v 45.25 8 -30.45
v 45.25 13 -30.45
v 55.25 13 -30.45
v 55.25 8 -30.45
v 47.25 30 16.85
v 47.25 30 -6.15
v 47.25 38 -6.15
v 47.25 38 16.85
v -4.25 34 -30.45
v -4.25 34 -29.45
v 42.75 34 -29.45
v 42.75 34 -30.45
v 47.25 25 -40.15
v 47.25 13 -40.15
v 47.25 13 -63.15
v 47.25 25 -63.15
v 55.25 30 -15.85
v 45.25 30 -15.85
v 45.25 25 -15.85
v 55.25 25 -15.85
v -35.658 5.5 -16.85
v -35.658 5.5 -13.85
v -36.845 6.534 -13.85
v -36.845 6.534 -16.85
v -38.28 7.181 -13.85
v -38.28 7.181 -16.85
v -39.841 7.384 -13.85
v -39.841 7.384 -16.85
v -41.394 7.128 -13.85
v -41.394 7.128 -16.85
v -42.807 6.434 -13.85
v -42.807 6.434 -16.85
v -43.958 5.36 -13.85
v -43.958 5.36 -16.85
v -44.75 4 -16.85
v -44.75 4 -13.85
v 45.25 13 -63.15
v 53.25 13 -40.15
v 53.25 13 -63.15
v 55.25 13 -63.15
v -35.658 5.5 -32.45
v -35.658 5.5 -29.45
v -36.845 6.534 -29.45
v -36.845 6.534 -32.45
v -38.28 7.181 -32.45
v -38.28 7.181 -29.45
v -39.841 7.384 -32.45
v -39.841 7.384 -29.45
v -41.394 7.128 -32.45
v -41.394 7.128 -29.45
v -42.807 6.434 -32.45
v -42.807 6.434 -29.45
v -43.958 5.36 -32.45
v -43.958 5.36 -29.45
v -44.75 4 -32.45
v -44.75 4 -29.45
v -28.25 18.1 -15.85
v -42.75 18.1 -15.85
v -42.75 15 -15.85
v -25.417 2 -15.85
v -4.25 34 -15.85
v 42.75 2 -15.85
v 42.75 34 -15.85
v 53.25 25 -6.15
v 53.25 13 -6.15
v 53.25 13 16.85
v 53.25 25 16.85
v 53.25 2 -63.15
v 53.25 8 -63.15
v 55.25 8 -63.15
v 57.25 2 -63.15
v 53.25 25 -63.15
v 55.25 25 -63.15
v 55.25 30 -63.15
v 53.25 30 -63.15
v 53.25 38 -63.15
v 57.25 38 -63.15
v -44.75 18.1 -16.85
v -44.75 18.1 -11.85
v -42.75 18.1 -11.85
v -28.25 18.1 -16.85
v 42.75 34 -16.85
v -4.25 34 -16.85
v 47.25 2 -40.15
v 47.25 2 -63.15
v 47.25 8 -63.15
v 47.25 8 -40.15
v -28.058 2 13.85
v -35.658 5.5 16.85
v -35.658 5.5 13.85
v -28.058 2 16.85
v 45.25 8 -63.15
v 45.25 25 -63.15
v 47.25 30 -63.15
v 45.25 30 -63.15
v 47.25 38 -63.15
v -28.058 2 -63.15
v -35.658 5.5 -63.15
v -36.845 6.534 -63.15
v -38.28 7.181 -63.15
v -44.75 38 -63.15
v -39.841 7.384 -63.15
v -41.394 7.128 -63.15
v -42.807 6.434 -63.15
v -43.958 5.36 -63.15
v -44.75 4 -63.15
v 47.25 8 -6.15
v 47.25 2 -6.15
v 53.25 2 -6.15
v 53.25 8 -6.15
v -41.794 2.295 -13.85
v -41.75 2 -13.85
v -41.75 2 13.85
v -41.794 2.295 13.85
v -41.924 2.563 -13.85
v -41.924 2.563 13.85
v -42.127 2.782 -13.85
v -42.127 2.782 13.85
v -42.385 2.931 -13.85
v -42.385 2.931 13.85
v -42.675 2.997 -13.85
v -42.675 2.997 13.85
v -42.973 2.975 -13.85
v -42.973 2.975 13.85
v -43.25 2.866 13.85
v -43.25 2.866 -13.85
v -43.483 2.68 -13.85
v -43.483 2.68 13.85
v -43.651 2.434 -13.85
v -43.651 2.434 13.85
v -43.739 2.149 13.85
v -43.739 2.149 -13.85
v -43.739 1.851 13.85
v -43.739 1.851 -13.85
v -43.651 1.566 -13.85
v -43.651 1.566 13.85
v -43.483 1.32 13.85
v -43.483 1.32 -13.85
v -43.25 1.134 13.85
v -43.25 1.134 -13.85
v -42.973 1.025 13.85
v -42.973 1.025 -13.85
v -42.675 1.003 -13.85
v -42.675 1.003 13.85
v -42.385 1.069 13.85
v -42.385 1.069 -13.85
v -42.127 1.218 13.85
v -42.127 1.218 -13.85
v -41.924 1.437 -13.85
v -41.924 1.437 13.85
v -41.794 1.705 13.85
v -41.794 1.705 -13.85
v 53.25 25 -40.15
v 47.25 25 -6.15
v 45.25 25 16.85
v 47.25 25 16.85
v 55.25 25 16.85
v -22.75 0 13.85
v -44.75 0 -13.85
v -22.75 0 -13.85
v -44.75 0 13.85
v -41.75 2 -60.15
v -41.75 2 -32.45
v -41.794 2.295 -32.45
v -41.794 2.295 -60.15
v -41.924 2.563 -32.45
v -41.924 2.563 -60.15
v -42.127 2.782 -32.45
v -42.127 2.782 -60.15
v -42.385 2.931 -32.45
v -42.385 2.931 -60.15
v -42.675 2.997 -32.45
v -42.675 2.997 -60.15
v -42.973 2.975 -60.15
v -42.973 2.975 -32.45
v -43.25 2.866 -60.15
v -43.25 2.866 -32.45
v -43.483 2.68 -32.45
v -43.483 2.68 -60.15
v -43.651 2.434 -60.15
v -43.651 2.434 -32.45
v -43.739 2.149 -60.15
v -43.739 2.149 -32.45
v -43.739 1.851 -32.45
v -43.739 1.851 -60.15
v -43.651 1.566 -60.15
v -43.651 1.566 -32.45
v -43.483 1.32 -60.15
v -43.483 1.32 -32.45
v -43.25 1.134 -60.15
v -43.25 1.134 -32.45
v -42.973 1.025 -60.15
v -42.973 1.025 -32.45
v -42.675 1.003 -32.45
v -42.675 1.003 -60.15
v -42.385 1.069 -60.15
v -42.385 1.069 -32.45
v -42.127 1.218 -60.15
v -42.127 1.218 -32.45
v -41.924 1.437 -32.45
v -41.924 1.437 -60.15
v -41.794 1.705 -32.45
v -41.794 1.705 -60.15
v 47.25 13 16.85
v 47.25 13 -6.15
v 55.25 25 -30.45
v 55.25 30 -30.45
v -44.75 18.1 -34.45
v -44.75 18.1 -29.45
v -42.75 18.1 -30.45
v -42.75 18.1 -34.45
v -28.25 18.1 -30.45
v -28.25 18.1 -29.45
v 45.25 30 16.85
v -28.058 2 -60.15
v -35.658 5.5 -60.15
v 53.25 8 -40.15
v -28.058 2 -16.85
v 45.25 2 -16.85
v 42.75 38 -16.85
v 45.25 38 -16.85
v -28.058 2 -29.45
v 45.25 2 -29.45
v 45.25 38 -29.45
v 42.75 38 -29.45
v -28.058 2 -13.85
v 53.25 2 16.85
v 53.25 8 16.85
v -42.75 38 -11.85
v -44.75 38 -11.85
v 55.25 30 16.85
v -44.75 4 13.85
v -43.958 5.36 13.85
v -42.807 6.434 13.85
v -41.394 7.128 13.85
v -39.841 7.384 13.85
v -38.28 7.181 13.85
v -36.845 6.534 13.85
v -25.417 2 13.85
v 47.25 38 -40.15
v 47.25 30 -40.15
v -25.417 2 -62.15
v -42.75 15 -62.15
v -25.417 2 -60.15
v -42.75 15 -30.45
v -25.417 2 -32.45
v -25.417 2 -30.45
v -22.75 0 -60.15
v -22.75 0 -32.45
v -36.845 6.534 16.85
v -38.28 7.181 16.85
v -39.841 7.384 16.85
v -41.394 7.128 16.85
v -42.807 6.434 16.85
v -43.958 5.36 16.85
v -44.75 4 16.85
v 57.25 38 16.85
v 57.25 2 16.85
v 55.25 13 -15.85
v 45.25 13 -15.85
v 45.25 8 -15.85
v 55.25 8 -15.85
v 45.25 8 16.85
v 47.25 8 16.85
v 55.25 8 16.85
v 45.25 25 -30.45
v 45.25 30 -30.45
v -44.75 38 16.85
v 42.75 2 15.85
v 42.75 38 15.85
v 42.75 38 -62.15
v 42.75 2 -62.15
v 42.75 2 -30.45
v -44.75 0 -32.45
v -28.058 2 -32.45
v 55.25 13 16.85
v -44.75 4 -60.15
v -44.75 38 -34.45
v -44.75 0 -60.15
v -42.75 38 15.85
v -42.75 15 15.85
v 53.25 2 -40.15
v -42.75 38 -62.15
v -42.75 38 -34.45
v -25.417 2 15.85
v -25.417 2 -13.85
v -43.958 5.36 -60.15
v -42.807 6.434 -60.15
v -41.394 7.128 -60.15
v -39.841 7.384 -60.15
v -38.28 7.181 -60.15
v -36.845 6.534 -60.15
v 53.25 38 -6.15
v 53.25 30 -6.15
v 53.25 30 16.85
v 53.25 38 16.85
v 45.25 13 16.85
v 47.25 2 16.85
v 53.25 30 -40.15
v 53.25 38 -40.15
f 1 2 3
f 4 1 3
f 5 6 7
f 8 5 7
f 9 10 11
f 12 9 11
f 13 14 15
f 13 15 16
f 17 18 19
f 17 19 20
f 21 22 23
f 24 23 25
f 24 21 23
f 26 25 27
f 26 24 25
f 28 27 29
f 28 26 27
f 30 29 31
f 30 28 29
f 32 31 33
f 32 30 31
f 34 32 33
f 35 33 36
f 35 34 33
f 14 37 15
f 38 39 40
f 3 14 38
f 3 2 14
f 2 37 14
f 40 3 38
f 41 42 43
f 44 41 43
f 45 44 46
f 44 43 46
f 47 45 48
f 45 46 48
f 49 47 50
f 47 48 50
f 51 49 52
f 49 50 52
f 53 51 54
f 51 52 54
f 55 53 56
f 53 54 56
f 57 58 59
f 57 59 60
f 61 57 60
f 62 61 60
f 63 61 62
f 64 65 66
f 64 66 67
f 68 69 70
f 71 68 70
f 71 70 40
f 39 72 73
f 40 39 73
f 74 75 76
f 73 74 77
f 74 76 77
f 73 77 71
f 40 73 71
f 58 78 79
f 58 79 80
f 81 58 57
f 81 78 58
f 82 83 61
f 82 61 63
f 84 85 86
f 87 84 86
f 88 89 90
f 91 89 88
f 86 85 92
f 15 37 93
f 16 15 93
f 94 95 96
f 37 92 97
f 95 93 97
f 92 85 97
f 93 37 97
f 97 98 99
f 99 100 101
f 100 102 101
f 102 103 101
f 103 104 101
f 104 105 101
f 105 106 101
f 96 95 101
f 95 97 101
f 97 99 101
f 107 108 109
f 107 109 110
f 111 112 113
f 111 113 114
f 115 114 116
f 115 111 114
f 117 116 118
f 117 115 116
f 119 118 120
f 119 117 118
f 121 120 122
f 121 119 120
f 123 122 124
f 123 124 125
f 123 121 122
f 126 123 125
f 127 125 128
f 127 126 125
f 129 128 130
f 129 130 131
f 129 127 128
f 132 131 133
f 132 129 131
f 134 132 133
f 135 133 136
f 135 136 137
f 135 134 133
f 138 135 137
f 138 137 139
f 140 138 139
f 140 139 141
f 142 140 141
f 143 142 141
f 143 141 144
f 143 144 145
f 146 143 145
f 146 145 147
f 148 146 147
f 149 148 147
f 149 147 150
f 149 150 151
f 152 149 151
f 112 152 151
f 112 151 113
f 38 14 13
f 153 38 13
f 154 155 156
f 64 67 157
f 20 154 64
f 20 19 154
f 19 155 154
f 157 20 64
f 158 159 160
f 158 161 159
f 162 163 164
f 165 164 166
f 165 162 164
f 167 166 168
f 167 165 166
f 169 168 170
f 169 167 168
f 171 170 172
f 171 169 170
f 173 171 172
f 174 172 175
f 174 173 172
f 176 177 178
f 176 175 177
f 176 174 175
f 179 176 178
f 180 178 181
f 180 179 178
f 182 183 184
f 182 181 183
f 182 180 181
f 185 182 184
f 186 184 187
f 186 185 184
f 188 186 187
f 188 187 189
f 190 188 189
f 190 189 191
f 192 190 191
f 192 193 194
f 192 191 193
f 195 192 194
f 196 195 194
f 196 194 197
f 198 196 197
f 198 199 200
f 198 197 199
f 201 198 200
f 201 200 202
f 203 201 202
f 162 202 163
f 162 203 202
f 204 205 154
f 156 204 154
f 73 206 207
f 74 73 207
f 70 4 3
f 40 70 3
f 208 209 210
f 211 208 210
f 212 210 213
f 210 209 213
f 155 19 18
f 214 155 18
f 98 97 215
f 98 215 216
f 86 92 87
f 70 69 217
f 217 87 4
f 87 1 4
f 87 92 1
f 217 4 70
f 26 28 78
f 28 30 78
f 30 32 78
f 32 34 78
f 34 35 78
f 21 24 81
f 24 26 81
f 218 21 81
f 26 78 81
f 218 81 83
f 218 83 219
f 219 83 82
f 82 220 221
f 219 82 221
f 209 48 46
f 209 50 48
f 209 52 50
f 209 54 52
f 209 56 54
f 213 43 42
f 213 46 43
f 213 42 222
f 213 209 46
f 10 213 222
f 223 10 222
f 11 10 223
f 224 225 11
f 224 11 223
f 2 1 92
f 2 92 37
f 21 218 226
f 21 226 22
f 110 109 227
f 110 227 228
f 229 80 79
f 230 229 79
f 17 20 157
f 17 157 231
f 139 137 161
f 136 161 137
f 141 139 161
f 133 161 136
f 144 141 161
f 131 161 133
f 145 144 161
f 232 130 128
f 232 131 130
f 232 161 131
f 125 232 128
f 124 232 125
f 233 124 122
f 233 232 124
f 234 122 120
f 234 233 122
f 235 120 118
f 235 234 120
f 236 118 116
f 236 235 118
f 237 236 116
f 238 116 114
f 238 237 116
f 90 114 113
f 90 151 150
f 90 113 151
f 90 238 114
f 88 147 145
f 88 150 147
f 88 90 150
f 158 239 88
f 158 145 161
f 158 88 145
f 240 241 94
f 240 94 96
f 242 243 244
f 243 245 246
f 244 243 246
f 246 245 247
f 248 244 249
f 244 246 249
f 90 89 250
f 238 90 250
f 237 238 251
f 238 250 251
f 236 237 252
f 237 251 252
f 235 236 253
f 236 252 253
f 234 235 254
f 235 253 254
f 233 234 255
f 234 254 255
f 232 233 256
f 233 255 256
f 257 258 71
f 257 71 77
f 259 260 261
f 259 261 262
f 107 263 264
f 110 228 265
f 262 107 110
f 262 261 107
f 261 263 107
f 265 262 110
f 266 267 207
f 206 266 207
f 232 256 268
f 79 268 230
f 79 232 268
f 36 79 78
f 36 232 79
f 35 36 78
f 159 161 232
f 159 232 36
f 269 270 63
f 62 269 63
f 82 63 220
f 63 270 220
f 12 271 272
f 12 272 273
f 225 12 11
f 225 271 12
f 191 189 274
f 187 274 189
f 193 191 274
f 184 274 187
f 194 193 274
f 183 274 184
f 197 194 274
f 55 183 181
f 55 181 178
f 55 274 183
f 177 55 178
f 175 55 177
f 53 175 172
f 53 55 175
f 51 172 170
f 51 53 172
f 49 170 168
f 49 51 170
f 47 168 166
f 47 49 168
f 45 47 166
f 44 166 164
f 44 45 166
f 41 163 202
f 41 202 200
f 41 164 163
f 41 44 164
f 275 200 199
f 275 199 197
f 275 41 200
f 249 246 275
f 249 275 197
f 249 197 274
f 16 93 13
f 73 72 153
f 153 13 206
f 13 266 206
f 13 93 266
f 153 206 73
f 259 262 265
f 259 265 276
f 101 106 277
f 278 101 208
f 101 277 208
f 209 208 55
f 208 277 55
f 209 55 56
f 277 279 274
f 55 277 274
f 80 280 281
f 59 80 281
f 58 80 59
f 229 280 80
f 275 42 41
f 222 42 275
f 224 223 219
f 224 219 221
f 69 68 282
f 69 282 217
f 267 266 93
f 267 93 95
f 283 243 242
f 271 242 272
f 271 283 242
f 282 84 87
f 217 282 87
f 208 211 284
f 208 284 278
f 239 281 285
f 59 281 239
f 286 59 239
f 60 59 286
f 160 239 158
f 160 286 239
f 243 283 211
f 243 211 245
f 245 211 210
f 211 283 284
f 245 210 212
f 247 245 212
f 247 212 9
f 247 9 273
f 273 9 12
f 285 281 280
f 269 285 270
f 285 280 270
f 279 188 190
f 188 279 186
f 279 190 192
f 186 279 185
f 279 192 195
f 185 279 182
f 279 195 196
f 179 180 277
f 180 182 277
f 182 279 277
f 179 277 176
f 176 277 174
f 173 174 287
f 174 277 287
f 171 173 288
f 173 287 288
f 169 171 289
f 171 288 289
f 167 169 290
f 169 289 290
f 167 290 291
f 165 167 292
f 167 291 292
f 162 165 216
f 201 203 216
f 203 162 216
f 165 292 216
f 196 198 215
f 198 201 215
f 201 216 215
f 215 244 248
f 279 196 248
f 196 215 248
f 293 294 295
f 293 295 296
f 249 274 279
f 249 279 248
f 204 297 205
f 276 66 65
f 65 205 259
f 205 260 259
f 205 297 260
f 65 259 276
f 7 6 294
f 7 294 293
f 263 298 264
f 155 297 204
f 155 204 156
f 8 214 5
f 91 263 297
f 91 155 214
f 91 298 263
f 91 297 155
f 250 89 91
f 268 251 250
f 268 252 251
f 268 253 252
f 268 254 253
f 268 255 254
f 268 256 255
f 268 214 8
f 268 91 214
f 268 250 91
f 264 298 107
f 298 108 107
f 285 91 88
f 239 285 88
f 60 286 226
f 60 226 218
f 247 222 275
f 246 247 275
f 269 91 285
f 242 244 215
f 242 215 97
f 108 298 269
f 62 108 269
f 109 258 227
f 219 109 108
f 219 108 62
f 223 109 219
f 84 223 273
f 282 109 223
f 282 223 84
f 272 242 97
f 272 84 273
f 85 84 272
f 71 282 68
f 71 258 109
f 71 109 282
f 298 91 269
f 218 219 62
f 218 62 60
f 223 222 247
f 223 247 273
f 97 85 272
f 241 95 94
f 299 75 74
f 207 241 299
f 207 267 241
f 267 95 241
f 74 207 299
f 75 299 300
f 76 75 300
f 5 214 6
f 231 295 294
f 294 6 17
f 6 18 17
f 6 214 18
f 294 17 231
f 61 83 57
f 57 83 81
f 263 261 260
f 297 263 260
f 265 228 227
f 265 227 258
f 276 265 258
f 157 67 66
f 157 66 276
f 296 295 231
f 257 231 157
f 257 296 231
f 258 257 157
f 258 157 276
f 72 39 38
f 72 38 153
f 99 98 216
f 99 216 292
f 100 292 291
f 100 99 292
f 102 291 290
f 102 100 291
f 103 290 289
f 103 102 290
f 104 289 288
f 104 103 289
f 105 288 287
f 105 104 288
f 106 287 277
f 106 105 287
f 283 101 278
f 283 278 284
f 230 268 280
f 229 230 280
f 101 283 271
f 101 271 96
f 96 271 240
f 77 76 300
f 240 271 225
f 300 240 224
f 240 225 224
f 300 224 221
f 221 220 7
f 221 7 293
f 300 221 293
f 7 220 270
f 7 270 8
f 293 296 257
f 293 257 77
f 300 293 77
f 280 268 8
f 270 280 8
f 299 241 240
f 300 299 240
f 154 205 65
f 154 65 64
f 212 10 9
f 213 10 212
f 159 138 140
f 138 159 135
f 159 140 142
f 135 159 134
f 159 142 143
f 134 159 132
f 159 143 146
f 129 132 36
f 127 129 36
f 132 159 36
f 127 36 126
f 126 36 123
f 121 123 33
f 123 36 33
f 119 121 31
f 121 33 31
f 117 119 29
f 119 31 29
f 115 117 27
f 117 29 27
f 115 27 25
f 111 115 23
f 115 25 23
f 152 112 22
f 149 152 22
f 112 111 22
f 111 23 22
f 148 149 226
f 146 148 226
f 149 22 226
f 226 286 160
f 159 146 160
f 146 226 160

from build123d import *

# Parameters (mm, degrees)
SKETCH2_W            = 89.5
SKETCH2_H            = 33.7
BOSS_EXTRUDE1_DEPTH  = 38
SKETCH3_W            = 85.5
SKETCH3_H            = 31.7
CUT_EXTRUDE1_DEPTH   = 38
BOSS_EXTRUDE2_DEPTH  = 31.7
SKETCH5_W            = 33.7
SKETCH5_H            = 38
BOSS_EXTRUDE3_DEPTH  = 2.5
SKETCH6_W            = 2
SKETCH6_H            = 38
BOSS_EXTRUDE4_DEPTH  = 6.3
SKETCH7_W            = 34
SKETCH7_H            = 38
BOSS_EXTRUDE5_DEPTH  = 10
SKETCH8_W            = 4
SKETCH8_H            = 38
BOSS_EXTRUDE6_DEPTH  = 23
CUT_EXTRUDE2_START   = -32.7
SKETCH9_W            = 10
SKETCH9_H            = 5
CUT_EXTRUDE2_DEPTH   = 32.7
SKETCH11_W           = 80
SKETCH11_H           = 2
CUT_EXTRUDE3_DEPTH   = 80
CUT_EXTRUDE4_DEPTH   = 3
MIRROR4_COPY_1_DEPTH = 3
CUT_EXTRUDE5_START   = -74
SKETCH13_R           = 1
CUT_EXTRUDE5_DEPTH   = 74
SKETCH15_W           = 47
SKETCH15_H           = 1
CUT_EXTRUDE6_DEPTH   = 4
SKETCH16_W           = 40.5
SKETCH16_H           = 2
CUT_EXTRUDE7_DEPTH   = 19.9
SKETCH17_W           = 2
SKETCH17_H           = 19.9
CUT_EXTRUDE8_DEPTH   = 3
BOSS_EXTRUDE7_START  = -1
BOSS_EXTRUDE7_DEPTH  = 1


with BuildPart() as part:
    # Sketch2 → Boss-Extrude1 (new body)
    with BuildSketch(Plane(origin=(0, 0, 0), x_dir=(1, 0, 0), z_dir=(0, 1, 0))):
        Rectangle(SKETCH2_W, SKETCH2_H)
    extrude(amount=BOSS_EXTRUDE1_DEPTH)

    # Sketch3 → Cut-Extrude1 (cut)
    with BuildSketch(Plane(origin=(0, 38, 0), x_dir=(1, 0, 0), z_dir=(0, 1, 0))):
        Rectangle(SKETCH3_W, SKETCH3_H)
    extrude(amount=-CUT_EXTRUDE1_DEPTH, mode=Mode.SUBTRACT)

    # Sketch4 → Boss-Extrude2 (add)
    with BuildSketch(Plane.XY.offset(-15.85)):
        Polygon((-42.75, 0), (-42.75, 15), (-22.75, 0), align=None)
    extrude(amount=BOSS_EXTRUDE2_DEPTH)

    # Sketch5 → Boss-Extrude3 (add)
    with BuildSketch(Plane(origin=(44.75, 0, 0), x_dir=(0, 0, -1), z_dir=(1, 0, 0))):
        with Locations((0, 19)):
            Rectangle(SKETCH5_W, SKETCH5_H)
    extrude(amount=BOSS_EXTRUDE3_DEPTH)

    # Sketch6 → Boss-Extrude4 (add)
    with BuildSketch(Plane(origin=(0, 0, -16.85), x_dir=(-1, 0, 0), z_dir=(0, 0, -1))):
        with Locations((-46.25, 19)):
            Rectangle(SKETCH6_W, SKETCH6_H)
    extrude(amount=BOSS_EXTRUDE4_DEPTH)

    # Mirror1: part across plane


with BuildPart() as part_1:
    add(part.part)
    add(part.part.mirror(Plane(origin=(0, 0, -23.15), x_dir=(1, 0, 0), z_dir=(0, 0, -1))))

    # Sketch7 → Boss-Extrude5 (add)
    with BuildSketch(Plane(origin=(47.25, 0, 0), x_dir=(0, 0, -1), z_dir=(1, 0, 0))):
        with Locations((23.15, 19)):
            Rectangle(SKETCH7_W, SKETCH7_H)
    extrude(amount=BOSS_EXTRUDE5_DEPTH)

    # Sketch8 → Boss-Extrude6 (add)
    with BuildSketch(Plane.XY.offset(-6.15)):
        with Locations((55.25, 19)):
            Rectangle(SKETCH8_W, SKETCH8_H)
    boss_extrude6 = extrude(amount=BOSS_EXTRUDE6_DEPTH)

    # Sketch9 → Cut-Extrude2 (cut)
    with BuildSketch(Plane.XY.offset(16.85).offset(CUT_EXTRUDE2_START)):
        with Locations((50.25, 27.5)):
            Rectangle(SKETCH9_W, SKETCH9_H)
        with Locations((50.25, 10.5)):
            Rectangle(SKETCH9_W, SKETCH9_H)
    cut_extrude2 = extrude(amount=CUT_EXTRUDE2_DEPTH, mode=Mode.SUBTRACT)

    # Mirror2: Boss-Extrude6, Cut-Extrude2 across plane
    add(boss_extrude6.mirror(Plane(origin=(0, 0, -23.15), x_dir=(1, 0, 0), z_dir=(0, 0, -1))))
    add(cut_extrude2.mirror(Plane(origin=(0, 0, -23.15), x_dir=(1, 0, 0), z_dir=(0, 0, -1))), mode=Mode.SUBTRACT)

    # Sketch11 → Cut-Extrude3 (cut)
    with BuildSketch(Plane(origin=(57.25, 0, 0), x_dir=(0, 0, -1), z_dir=(1, 0, 0))):
        with Locations((23.15, 1)):
            Rectangle(SKETCH11_W, SKETCH11_H)
    extrude(amount=-CUT_EXTRUDE3_DEPTH, mode=Mode.SUBTRACT)

    # Sketch12 → Cut-Extrude4 (cut)
    with BuildSketch(Plane.XY.offset(16.85)):
        with BuildLine():
            Line((-22.75, 2), (-34.364835193, 2))
            ThreePointArc((-34.364835193, 2), (-40.768375168, 7.287996976), (-44.75, 0))
            Line((-44.75, 0), (-22.75, 0))
            Line((-22.75, 0), (-22.75, 2))
        make_face()
    cut_extrude4 = extrude(amount=-CUT_EXTRUDE4_DEPTH, mode=Mode.SUBTRACT)

    # Mirror3: Cut-Extrude4 across plane
    add(cut_extrude4.mirror(Plane.XY), mode=Mode.SUBTRACT)

    # Mirror4: Cut-Extrude4 across plane
    add(cut_extrude4.mirror(Plane(origin=(0, 0, -23.15), x_dir=(1, 0, 0), z_dir=(0, 0, -1))), mode=Mode.SUBTRACT)

    # Mirror4 copy 1 sketch → Mirror4 copy 1 (cut)
    with BuildSketch(Plane.XY.offset(-29.45)):
        with BuildLine():
            Line((-22.75, 2), (-34.364835193, 2))
            ThreePointArc((-34.364835193, 2), (-40.768375168, 7.287996976), (-44.75, 0))
            Line((-44.75, 0), (-22.75, 0))
            Line((-22.75, 0), (-22.75, 2))
        make_face()
    extrude(amount=-MIRROR4_COPY_1_DEPTH, mode=Mode.SUBTRACT)

    # Sketch13 → Cut-Extrude5 (cut)
    with BuildSketch(Plane.XY.offset(13.85).offset(CUT_EXTRUDE5_START)):
        with Locations((-42.75, 2)):
            Circle(SKETCH13_R)
    extrude(amount=CUT_EXTRUDE5_DEPTH, mode=Mode.SUBTRACT)

    # Chamfer1
    # the kernel refuses this chamfer: 10 mm, written as the material it takes off along each edge
    with BuildSketch(Plane(origin=(-34.364835193, 2, 33.530669666), x_dir=(-0.4115208033655663, 0.9114003666870882, 0), z_dir=(0, 0, -1))) as chamfer1_piece_1:
        with BuildLine():
            Line((4.024103798, 0), (-2.897424879, 6.010331734))
            Line((-2.897424879, 6.010331734), (-3.079704953, 5.928027573))
            ThreePointArc((-3.079704953, 5.928027573), (-1.554736759, 2.957293148), (-0.182280073, -0.082304161))
            Line((-0.182280073, -0.082304161), (0.082304161, -0.182280073))
            ThreePointArc((0.082304161, -0.182280073), (2.000716354, 0.27264804), (3.968173362, -0.192020276))
            Line((3.968173362, -0.192020276), (4.024103798, 0))
        make_face()
    extrude(amount=19.680669666, mode=Mode.SUBTRACT)

    # Chamfer2
    # the kernel refuses this chamfer: 10 mm, written as the material it takes off along each edge
    with BuildSketch(Plane(origin=(-34.364835193, 2, -33.530669666), x_dir=(0.9996854583228201, -0.025079561756403367, 0), z_dir=(0, 0, 1))) as chamfer2_piece_1_section:
        with BuildLine():
            Line((6.304869905, 0.158173126), (-1.380064624, 3.466711132))
            ThreePointArc((-1.380064624, 3.466711132), (-0.439598609, 1.999919309), (0, 0))
            Line((0, 0), (6.304869905, 0.158173126))
        make_face()
    chamfer2_piece_1 = extrude(amount=19.680669666, mode=Mode.PRIVATE)
    chamfer2_piece_1 = split(chamfer2_piece_1, bisect_by=Plane(origin=(-32.514060805, 3.115216655, -29.45), z_dir=(0, 0, 1)), keep=Keep.TOP, mode=Mode.PRIVATE)
    add(chamfer2_piece_1, mode=Mode.SUBTRACT)

    # Chamfer3
    # the kernel refuses this chamfer: 10 mm, written as the material it takes off along each edge
    with BuildSketch(Plane(origin=(-34.364835193, 2, -12.769330334), x_dir=(-0.4115208033655663, 0.9114003666870882, 0), z_dir=(0, 0, -1))) as chamfer3_piece_1_section:
        with BuildLine():
            Line((4.024103798, 0), (-2.897424879, 6.010331734))
            Line((-2.897424879, 6.010331734), (-3.079704953, 5.928027573))
            ThreePointArc((-3.079704953, 5.928027573), (-1.554736759, 2.957293148), (-0.182280073, -0.082304161))
            Line((-0.182280073, -0.082304161), (0.082304161, -0.182280073))
            ThreePointArc((0.082304161, -0.182280073), (2.000716354, 0.27264804), (3.968173362, -0.192020276))
            Line((3.968173362, -0.192020276), (4.024103798, 0))
        make_face()
    chamfer3_piece_1 = extrude(amount=19.680669666, mode=Mode.PRIVATE)
    chamfer3_piece_1 = split(chamfer3_piece_1, bisect_by=Plane(origin=(-32.482113907, 3.03712607, -13.85), z_dir=(0, 0, -1)), keep=Keep.TOP, mode=Mode.PRIVATE)
    add(chamfer3_piece_1, mode=Mode.SUBTRACT)

    # Chamfer4
    # the kernel refuses this chamfer: 10 mm, written as the material it takes off along each edge
    with BuildSketch(Plane(origin=(-34.364835193, 2, -79.830669666), x_dir=(0.9996854583228201, -0.025079561756403367, 0), z_dir=(0, 0, 1))) as chamfer4_piece_1:
        with BuildLine():
            Line((6.672267866, 0), (-1.747462586, 3.624884258))
            Line((-1.747462586, 3.624884258), (-1.896145364, 3.491117927))
            ThreePointArc((-1.896145364, 3.491117927), (-0.623209418, 1.920628258), (-0.199937092, -0.005015912))
            Line((-0.199937092, -0.005015912), (0.005015912, -0.199937092))
            ThreePointArc((0.005015912, -0.199937092), (3.339051469, -0.116294632), (6.677283779, -0.199937092))
            Line((6.677283779, -0.199937092), (6.672267866, 0))
        make_face()
    extrude(amount=19.680669666, mode=Mode.SUBTRACT)

    # Sketch15 → Cut-Extrude6 (cut)
    with BuildSketch(Plane(origin=(0, 38, 0), x_dir=(1, 0, 0), z_dir=(0, 1, 0))):
        with Locations((19.25, 16.35)):
            Rectangle(SKETCH15_W, SKETCH15_H)
    cut_extrude6 = extrude(amount=-CUT_EXTRUDE6_DEPTH, mode=Mode.SUBTRACT)

    # Sketch16 → Cut-Extrude7 (cut)
    with BuildSketch(Plane(origin=(0, 38, 0), x_dir=(1, 0, 0), z_dir=(0, 1, 0))):
        with Locations((-24.5, 15.85)):
            Rectangle(SKETCH16_W, SKETCH16_H)
    cut_extrude7 = extrude(amount=-CUT_EXTRUDE7_DEPTH, mode=Mode.SUBTRACT)

    # Sketch17 → Cut-Extrude8 (cut)
    with BuildSketch(Plane(origin=(0, 0, -14.85), x_dir=(-1, 0, 0), z_dir=(0, 0, -1))):
        with Locations((43.75, 28.05)):
            Rectangle(SKETCH17_W, SKETCH17_H)
    cut_extrude8 = extrude(amount=-CUT_EXTRUDE8_DEPTH, mode=Mode.SUBTRACT)

    # Sketch18 → Boss-Extrude7 (add)
    with BuildSketch(Plane.XY.offset(-15.85).offset(BOSS_EXTRUDE7_START)):
        Polygon((-4.25, 18.1), (-4.25, 34), (-28.25, 18.1), align=None)
    boss_extrude7 = extrude(amount=BOSS_EXTRUDE7_DEPTH)

    # Mirror5: Cut-Extrude6, Cut-Extrude7, Cut-Extrude8, Boss-Extrude7 across plane
    add(cut_extrude6.mirror(Plane(origin=(0, 0, -23.15), x_dir=(1, 0, 0), z_dir=(0, 0, -1))), mode=Mode.SUBTRACT)
    add(cut_extrude7.mirror(Plane(origin=(0, 0, -23.15), x_dir=(1, 0, 0), z_dir=(0, 0, -1))), mode=Mode.SUBTRACT)
    add(cut_extrude8.mirror(Plane(origin=(0, 0, -23.15), x_dir=(1, 0, 0), z_dir=(0, 0, -1))), mode=Mode.SUBTRACT)
    add(boss_extrude7.mirror(Plane(origin=(0, 0, -23.15), x_dir=(1, 0, 0), z_dir=(0, 0, -1))))


solid = part_1.part
